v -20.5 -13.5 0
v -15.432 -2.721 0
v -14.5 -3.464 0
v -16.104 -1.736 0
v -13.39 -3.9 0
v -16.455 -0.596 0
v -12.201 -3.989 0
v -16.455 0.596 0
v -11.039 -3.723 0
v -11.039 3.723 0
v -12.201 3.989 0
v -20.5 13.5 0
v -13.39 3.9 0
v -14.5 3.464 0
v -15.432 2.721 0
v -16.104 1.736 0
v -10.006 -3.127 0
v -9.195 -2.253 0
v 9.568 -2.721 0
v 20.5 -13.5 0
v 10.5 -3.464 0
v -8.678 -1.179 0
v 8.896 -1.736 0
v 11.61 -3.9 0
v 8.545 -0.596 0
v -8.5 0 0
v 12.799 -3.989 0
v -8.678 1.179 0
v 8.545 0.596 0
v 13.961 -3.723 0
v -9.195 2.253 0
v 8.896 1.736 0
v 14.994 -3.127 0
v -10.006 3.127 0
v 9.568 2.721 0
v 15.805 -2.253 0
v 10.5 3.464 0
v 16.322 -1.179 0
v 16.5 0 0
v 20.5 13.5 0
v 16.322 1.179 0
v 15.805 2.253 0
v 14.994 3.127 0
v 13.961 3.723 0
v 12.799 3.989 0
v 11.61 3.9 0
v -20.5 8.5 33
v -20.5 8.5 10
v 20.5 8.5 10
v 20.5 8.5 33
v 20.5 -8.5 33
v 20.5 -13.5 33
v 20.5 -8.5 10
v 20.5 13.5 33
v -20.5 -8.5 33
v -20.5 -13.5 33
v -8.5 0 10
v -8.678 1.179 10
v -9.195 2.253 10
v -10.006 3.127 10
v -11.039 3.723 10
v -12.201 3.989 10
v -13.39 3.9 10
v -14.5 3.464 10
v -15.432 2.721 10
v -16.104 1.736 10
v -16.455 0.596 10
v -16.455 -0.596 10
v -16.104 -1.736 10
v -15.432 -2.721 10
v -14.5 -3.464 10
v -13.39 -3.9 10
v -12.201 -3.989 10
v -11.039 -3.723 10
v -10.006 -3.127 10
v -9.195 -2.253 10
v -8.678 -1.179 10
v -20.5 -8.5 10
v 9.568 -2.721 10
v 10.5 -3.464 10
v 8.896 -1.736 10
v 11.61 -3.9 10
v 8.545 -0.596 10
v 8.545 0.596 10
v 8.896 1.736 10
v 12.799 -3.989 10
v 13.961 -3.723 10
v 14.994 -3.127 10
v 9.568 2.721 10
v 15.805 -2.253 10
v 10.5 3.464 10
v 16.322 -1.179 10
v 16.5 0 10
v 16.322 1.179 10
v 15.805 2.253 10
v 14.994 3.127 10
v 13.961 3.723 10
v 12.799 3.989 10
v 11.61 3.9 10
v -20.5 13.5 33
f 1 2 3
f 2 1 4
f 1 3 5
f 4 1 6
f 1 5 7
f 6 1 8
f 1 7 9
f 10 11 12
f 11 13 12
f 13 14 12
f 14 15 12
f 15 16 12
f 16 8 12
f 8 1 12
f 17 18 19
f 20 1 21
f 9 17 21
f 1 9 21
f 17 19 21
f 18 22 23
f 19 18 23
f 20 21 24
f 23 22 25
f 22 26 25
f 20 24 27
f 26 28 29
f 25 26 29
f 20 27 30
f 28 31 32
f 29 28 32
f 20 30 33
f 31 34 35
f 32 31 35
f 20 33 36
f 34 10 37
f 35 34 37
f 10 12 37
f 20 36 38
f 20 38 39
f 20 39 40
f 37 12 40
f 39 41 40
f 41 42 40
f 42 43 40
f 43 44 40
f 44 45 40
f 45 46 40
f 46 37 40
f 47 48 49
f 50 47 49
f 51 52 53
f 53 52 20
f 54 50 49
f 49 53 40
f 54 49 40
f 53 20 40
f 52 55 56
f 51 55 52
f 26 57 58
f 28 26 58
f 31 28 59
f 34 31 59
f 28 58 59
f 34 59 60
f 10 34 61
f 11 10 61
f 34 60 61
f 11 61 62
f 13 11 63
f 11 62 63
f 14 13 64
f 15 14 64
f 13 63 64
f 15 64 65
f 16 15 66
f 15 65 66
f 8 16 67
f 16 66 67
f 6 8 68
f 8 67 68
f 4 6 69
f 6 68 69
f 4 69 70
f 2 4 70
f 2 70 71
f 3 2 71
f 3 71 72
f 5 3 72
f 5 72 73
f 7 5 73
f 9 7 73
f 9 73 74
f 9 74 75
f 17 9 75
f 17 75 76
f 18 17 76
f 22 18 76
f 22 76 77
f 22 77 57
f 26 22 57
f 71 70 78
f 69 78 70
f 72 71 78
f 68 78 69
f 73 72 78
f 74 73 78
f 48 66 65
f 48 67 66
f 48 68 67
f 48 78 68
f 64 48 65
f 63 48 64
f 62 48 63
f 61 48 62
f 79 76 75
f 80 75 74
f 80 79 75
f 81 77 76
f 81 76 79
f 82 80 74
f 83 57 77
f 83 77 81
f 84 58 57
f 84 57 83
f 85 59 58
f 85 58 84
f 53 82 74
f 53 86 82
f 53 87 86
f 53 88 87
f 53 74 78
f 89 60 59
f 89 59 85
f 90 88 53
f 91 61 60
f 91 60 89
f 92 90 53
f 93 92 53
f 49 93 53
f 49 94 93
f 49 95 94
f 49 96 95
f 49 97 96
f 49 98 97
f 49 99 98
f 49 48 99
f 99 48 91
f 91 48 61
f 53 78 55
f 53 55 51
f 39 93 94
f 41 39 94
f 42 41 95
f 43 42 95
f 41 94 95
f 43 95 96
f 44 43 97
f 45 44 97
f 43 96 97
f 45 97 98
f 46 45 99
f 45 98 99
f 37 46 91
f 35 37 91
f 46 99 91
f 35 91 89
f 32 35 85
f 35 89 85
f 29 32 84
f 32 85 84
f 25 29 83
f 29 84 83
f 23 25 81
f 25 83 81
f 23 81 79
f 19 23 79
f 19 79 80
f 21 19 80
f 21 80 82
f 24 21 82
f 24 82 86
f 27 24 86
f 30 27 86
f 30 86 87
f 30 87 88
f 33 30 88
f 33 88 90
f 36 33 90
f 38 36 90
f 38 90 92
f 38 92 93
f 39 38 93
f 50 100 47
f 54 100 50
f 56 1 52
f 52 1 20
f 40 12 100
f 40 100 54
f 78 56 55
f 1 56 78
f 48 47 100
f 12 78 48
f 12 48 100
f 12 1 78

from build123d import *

# Parameters (mm, degrees)
SKETCH1_W           = 41
SKETCH1_H           = 27
BOSS_EXTRUDE1_DEPTH = 10
SKETCH2_W           = 41
SKETCH2_H           = 5
BOSS_EXTRUDE2_DEPTH = 23
CUT_EXTRUDE1_REACH  = 35.638
SKETCH3_R           = 4


with BuildPart() as part:
    # Sketch1 → Boss-Extrude1 (new body)
    with BuildSketch(Plane.XY):
        Rectangle(SKETCH1_W, SKETCH1_H)
    extrude(amount=BOSS_EXTRUDE1_DEPTH)

    # Sketch2 → Boss-Extrude2 (add)
    with BuildSketch(Plane.XY.offset(10)):
        with Locations((0, 11)):
            Rectangle(SKETCH2_W, SKETCH2_H)
        with Locations((0, -11)):
            Rectangle(SKETCH2_W, SKETCH2_H)
    extrude(amount=BOSS_EXTRUDE2_DEPTH)

    # Sketch3 → Cut-Extrude1 (cut, up to next)
    with BuildSketch(Plane.XY.offset(10), mode=Mode.PRIVATE) as cut_extrude1_sk1:
        with Locations((-12.5, 0)):
            Circle(SKETCH3_R)
    cut_extrude1_tool1 = extrude(cut_extrude1_sk1.sketch, amount=-CUT_EXTRUDE1_REACH, mode=Mode.PRIVATE) & part.part
    # Sketch3 → Cut-Extrude1 (cut, up to next)
    with BuildSketch(Plane.XY.offset(10), mode=Mode.PRIVATE) as cut_extrude1_sk2:
        with Locations((12.5, 0)):
            Circle(SKETCH3_R)
    cut_extrude1_tool2 = extrude(cut_extrude1_sk2.sketch, amount=-CUT_EXTRUDE1_REACH, mode=Mode.PRIVATE) & part.part
    add(cut_extrude1_tool1.solids().sort_by_distance((-12.5, 0, 10))[0], mode=Mode.SUBTRACT)
    add(cut_extrude1_tool2.solids().sort_by_distance((12.5, 0, 10))[0], mode=Mode.SUBTRACT)


solid = part.part
